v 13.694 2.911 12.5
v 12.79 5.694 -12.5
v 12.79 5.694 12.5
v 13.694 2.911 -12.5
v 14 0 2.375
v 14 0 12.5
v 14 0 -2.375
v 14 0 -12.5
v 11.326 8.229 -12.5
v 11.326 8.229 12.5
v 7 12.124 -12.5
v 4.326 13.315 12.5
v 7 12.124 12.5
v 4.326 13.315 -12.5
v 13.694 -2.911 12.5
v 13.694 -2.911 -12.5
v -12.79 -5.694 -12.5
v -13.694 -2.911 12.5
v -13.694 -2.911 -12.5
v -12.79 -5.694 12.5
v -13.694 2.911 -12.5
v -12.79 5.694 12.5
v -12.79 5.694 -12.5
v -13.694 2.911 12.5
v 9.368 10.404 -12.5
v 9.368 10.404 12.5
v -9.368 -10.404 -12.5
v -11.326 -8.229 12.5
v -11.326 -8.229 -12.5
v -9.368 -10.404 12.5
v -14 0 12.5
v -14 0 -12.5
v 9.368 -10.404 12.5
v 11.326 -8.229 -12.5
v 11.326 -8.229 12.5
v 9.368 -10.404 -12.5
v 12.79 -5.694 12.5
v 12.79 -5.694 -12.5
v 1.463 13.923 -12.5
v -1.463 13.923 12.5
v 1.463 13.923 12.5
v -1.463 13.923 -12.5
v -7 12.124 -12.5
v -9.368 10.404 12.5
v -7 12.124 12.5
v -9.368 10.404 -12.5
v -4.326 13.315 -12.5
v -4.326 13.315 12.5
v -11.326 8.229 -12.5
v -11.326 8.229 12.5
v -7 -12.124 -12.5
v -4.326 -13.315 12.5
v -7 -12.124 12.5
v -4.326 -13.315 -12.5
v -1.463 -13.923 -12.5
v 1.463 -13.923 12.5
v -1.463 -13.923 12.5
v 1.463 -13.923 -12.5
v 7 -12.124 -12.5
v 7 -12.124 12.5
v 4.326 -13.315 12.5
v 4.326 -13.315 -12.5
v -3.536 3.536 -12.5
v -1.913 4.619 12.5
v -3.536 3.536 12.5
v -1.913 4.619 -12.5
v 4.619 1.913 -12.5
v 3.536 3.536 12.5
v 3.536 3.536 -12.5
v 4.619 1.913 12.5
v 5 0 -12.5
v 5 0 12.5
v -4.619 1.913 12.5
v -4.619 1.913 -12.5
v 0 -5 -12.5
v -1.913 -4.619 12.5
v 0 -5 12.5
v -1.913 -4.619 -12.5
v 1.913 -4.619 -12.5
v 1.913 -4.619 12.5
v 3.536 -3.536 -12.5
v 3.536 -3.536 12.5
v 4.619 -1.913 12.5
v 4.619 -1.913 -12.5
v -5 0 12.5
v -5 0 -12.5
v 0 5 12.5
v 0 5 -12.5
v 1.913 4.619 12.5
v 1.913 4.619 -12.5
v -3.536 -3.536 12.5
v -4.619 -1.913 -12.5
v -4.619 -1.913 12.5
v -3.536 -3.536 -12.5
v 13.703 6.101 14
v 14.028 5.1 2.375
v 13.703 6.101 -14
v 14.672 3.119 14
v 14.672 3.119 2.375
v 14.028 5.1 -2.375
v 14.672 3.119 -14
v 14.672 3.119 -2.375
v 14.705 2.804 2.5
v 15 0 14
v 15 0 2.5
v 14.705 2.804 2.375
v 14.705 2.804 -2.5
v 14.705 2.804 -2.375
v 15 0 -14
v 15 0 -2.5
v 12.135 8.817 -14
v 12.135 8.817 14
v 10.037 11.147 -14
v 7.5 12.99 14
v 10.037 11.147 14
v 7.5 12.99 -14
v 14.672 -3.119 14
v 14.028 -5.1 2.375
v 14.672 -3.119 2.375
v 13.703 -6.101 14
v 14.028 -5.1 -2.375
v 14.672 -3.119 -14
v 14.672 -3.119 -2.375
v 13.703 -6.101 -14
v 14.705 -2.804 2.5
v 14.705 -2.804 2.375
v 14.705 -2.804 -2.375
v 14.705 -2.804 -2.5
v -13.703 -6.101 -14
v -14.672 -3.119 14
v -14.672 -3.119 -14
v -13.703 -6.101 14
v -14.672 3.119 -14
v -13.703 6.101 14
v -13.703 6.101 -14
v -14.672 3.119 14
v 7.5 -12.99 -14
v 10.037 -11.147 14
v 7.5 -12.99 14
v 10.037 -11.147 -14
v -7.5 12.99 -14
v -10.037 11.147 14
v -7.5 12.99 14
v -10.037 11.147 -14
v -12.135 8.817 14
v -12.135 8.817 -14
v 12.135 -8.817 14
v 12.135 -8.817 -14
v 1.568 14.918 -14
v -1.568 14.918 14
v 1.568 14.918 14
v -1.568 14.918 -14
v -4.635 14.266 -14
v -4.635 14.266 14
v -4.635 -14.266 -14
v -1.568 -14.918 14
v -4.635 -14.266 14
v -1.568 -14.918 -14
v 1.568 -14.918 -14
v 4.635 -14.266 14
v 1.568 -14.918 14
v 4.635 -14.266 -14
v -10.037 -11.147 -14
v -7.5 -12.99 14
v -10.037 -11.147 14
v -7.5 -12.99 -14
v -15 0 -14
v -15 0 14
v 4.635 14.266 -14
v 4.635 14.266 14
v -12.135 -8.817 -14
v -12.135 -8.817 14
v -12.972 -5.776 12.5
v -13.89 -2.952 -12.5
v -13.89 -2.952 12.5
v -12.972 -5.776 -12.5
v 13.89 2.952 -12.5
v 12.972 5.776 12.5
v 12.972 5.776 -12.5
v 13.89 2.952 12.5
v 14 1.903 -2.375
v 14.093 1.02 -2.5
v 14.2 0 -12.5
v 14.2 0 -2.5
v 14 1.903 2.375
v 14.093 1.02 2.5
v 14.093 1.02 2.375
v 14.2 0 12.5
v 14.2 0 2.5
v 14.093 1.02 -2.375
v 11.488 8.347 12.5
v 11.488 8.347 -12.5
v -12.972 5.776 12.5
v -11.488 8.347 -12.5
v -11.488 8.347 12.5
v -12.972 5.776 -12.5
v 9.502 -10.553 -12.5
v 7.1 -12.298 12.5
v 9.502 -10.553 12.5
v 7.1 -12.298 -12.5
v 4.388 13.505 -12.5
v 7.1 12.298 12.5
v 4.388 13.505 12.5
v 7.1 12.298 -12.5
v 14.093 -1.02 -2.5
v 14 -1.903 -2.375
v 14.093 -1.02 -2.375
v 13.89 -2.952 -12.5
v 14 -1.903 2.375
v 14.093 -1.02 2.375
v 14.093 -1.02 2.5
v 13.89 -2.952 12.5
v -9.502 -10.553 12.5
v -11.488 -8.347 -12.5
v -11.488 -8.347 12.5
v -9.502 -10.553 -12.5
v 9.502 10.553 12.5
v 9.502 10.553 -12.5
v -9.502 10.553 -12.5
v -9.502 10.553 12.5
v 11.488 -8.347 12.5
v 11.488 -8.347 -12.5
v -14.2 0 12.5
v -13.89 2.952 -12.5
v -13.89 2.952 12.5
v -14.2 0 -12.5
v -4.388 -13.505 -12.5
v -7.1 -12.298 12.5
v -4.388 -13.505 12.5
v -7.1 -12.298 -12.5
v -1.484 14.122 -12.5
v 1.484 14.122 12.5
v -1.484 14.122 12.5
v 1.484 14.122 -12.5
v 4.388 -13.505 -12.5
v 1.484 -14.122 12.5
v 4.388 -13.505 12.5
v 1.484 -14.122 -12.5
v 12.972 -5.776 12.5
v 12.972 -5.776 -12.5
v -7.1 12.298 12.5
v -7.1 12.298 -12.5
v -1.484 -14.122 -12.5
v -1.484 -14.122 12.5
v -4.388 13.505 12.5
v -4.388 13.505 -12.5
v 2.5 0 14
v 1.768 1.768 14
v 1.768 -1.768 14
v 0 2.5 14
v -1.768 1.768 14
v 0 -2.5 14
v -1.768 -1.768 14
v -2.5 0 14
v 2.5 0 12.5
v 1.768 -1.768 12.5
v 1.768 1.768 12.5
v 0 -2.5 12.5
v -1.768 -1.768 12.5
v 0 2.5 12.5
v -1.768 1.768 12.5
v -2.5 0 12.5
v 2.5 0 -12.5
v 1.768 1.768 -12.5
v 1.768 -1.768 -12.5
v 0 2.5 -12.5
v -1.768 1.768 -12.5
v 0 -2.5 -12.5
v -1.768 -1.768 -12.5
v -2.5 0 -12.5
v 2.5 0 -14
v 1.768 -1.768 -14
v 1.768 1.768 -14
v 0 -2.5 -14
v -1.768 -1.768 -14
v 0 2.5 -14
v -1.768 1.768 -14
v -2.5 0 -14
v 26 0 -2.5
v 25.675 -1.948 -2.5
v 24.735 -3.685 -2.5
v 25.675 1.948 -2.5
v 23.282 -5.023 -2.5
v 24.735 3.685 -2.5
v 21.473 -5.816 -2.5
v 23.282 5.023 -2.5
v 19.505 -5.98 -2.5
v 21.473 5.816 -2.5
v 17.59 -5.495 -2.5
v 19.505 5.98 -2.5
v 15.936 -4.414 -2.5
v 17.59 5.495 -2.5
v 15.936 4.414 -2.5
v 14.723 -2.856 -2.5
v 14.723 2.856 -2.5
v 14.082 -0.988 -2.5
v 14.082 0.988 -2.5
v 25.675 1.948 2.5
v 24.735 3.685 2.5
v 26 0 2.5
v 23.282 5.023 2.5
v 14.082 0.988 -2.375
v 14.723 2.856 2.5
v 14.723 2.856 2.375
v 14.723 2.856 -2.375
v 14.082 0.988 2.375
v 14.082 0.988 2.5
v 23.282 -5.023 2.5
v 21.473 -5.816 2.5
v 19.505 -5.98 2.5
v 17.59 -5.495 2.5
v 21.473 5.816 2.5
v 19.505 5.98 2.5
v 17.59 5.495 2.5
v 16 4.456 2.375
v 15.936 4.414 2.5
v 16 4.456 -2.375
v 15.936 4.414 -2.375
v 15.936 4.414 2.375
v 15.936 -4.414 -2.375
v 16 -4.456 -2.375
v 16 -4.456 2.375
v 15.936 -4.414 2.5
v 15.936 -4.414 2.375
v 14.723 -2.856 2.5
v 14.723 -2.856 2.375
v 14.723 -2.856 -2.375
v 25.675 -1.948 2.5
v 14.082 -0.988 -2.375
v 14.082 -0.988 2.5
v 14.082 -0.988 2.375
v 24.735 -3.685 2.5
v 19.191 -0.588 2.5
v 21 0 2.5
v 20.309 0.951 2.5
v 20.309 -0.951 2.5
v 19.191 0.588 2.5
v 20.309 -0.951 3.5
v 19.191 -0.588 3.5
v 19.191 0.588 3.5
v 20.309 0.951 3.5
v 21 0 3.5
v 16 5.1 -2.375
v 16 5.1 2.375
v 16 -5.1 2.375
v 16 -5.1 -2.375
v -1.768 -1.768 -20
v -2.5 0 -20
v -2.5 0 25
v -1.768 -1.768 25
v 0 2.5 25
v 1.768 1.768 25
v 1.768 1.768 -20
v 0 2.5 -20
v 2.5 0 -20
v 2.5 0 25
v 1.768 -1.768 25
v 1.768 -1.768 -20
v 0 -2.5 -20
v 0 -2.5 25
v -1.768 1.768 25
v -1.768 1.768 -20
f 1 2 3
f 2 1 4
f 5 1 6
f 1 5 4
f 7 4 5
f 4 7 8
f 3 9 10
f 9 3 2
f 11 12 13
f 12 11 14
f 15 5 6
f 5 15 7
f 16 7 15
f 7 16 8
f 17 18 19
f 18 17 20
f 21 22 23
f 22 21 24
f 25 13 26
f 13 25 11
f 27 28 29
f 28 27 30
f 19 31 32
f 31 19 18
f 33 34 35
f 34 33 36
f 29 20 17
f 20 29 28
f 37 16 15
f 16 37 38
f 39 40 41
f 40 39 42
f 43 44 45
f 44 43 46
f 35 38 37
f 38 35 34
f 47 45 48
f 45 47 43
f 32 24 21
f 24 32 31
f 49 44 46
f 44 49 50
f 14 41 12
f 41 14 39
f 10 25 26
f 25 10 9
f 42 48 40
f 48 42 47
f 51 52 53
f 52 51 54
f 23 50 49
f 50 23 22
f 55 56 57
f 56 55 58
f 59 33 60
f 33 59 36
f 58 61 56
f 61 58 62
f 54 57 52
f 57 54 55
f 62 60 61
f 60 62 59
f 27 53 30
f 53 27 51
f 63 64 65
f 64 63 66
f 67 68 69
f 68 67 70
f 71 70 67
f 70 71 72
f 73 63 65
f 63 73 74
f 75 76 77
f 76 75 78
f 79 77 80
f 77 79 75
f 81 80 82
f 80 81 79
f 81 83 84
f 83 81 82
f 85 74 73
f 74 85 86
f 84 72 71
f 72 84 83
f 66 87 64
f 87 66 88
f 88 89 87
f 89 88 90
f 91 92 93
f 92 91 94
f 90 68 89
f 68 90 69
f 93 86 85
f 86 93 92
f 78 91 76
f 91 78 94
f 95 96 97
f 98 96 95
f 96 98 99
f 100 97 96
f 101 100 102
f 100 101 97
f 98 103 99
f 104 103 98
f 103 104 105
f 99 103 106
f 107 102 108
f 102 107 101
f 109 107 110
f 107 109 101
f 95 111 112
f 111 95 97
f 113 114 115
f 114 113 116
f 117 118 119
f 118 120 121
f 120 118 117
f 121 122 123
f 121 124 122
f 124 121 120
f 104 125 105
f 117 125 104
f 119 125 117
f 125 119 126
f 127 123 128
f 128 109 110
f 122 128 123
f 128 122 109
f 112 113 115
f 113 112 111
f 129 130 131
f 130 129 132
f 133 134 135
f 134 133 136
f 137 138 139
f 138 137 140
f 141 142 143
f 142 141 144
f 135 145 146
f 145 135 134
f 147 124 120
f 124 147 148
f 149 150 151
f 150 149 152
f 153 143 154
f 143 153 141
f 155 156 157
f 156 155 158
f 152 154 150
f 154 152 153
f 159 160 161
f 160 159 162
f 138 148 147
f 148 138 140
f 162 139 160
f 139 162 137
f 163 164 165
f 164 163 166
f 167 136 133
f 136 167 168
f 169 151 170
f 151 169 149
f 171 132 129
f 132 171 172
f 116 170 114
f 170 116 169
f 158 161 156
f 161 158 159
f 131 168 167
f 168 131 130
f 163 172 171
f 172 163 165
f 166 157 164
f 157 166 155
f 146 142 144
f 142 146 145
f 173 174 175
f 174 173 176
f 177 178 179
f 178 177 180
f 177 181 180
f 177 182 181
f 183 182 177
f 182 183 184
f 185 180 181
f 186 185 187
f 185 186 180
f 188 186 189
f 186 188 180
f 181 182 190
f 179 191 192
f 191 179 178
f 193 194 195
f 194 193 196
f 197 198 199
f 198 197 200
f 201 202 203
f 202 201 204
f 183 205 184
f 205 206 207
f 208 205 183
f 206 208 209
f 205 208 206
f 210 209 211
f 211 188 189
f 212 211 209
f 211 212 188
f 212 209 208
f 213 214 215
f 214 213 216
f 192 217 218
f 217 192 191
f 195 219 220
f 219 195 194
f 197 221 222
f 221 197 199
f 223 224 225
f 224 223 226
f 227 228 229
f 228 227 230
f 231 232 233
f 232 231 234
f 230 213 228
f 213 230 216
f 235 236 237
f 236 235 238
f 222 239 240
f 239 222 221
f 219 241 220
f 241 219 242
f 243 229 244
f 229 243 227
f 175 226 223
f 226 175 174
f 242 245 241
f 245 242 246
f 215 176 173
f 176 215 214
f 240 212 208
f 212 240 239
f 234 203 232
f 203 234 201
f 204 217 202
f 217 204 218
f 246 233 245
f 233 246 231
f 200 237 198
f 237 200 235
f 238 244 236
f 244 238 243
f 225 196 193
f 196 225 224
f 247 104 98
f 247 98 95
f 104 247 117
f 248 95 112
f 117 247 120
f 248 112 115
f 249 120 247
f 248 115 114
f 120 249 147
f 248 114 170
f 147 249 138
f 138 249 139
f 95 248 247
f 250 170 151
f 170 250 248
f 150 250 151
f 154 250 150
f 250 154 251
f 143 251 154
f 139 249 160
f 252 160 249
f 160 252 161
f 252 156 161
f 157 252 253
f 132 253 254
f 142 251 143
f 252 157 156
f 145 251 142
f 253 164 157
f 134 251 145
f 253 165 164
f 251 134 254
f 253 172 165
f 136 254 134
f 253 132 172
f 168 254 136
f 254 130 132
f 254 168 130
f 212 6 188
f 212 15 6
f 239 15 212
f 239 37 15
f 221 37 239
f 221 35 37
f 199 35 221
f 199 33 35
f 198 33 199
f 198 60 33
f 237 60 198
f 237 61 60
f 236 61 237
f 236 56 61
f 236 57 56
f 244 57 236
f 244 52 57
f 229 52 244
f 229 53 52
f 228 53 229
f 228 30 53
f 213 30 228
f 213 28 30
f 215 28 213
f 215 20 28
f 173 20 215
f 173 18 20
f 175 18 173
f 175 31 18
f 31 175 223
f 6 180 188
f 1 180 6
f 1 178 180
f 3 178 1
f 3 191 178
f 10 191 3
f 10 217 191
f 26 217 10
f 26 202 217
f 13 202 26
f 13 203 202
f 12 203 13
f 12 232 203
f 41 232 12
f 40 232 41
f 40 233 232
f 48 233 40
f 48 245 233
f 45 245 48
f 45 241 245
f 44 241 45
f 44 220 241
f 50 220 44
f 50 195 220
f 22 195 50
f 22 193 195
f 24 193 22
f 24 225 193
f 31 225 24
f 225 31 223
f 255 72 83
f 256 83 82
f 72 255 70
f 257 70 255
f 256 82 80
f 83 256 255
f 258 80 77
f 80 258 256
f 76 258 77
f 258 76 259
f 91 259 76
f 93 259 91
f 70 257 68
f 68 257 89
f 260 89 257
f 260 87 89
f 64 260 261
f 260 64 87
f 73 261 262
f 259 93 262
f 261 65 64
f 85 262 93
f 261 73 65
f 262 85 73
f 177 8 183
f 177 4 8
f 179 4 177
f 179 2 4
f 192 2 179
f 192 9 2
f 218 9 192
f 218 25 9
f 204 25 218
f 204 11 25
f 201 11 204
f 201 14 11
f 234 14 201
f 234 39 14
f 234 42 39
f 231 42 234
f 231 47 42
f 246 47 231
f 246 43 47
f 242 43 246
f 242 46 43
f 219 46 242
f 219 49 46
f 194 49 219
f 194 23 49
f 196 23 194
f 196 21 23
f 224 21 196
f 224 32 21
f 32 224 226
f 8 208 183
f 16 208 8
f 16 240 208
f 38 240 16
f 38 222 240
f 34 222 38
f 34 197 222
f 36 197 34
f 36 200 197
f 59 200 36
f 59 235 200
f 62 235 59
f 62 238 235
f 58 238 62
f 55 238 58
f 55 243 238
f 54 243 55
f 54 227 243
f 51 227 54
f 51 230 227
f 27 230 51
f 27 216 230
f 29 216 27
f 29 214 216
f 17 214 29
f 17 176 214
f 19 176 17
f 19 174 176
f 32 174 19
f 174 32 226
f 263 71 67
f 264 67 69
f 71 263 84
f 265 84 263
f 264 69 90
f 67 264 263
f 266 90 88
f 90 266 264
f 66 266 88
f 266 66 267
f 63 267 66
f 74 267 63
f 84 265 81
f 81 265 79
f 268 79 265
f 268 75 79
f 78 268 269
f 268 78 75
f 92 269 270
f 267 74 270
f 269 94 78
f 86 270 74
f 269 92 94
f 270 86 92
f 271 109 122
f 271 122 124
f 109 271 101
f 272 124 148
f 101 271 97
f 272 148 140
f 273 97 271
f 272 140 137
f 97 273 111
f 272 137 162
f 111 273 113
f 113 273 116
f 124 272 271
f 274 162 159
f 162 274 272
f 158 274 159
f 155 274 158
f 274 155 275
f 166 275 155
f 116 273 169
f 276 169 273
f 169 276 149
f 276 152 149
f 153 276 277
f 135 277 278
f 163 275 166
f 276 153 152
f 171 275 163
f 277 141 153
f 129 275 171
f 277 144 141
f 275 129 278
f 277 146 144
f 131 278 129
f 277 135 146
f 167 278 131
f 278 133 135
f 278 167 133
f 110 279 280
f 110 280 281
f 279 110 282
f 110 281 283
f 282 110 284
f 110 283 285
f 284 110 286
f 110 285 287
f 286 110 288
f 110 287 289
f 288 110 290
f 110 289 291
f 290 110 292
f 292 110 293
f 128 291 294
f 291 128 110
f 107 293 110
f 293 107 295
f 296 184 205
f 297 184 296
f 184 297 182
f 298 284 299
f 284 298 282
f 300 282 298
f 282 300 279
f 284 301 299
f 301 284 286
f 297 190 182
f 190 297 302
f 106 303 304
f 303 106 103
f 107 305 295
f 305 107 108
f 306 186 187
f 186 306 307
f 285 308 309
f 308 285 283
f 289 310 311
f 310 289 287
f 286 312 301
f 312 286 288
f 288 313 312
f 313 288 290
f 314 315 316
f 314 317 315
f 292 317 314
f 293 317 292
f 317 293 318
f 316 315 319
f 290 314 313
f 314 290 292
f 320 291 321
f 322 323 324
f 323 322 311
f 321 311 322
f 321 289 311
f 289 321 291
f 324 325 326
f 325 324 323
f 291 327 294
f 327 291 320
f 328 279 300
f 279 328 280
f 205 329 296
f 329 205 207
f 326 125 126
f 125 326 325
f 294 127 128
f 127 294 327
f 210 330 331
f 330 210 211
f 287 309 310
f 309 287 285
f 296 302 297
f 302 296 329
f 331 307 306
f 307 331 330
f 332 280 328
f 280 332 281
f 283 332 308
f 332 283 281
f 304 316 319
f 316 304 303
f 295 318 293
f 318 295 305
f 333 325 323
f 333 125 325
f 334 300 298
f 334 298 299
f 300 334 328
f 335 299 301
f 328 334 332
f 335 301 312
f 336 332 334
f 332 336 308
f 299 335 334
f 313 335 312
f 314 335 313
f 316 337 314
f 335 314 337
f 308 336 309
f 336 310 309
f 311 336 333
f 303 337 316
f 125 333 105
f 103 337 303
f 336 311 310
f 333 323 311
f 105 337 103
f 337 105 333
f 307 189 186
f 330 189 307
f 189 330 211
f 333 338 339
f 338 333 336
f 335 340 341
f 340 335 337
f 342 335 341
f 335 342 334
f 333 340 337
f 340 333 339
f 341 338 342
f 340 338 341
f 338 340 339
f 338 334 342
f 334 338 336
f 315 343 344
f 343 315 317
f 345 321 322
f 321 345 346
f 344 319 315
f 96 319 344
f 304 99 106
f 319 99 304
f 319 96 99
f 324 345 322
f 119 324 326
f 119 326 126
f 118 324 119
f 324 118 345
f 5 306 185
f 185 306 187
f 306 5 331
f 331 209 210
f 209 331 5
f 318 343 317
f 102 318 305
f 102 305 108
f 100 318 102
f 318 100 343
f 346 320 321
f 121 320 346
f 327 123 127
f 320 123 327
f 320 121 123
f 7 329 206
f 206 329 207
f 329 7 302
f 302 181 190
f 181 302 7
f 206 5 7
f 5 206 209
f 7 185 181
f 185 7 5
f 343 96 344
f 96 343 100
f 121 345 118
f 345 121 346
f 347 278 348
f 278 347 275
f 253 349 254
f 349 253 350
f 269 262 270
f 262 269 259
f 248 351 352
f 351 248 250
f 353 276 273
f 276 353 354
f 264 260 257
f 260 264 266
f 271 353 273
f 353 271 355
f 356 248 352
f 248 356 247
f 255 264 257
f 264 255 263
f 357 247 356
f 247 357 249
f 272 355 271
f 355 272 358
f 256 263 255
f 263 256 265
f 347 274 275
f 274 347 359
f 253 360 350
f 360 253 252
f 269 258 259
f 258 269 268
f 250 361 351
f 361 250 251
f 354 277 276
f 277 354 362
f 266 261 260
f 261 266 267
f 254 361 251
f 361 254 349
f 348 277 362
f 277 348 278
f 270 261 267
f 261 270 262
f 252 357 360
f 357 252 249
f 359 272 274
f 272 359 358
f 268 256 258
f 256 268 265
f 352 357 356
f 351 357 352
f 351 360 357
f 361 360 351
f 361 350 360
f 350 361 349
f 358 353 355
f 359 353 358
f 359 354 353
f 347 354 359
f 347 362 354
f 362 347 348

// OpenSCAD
// Parameters
stator_diameter_mm = 28; //[14:56:0.5]
stator_height_mm = 27; //[13.5:54:0.5]
stator_bore_diameter_mm = 10; //[5:20:0.5]
rotor_outer_diameter_mm = 30; //[15:60:0.5]
rotor_height_mm = 27; //[13.5:54:0.5]
shaft_diameter_mm = 5; //[2.5:10:0.25]
shaft_extension_front_mm = 10; //[5:20:0.5]
shaft_extension_rear_mm = 5; //[2.5:10:0.5]
endcap_thickness_mm = 1.5; //[0.75:3:0.25]
clearance_mm = 0.2; //[0.05:0.6:0.05]
overlap_mm = 1; //[0.5:2:0.1]
buzzer_diameter_mm = 12; //[6:24:0.5]
buzzer_height_mm = 5; //[2.5:10:0.5]
buzzer_pin_diameter_mm = 2; //[1:4:0.25]
buzzer_pin_height_mm = 2; //[1:6:0.5]

// Buzzer / side component - FIXED: guaranteed physical attachment to rotor can
module buzzer() {
  rotor_r  = rotor_outer_diameter_mm/2;
  buzzer_r = buzzer_diameter_mm/2;

  // Place buzzer so it intersects the rotor side wall by overlap_mm (1-2mm recommended)
  // This removes any visible gap in top/bottom views and prevents floating geometry.
  buzzer_x = rotor_r + buzzer_r - overlap_mm;

  // Keep buzzer centered vertically on the motor so it doesn't appear offset/floating
  buzzer_z = 0;

  // Add a small "bridge" block that spans from inside the rotor radius to inside the buzzer,
  // guaranteeing a robust union even if render tolerances show a tiny gap.
  bridge_len = overlap_mm * 2;                 // thickness in X
  bridge_w   = buzzer_diameter_mm * 0.85;      // width in Y
  bridge_h   = buzzer_height_mm * 0.95;        // height in Z

  color([0.1, 0.1, 0.6])
  union() {
    // Buzzer body (main side component)
    translate([buzzer_x, 0, buzzer_z])
      cylinder(r=buzzer_r, h=buzzer_height_mm, center=true);

    // Buzzer pin - attached to buzzer body with overlap
    translate([buzzer_x, 0, buzzer_z + buzzer_height_mm/2 + buzzer_pin_height_mm/2 - overlap_mm])
      cylinder(r=buzzer_pin_diameter_mm/2, h=buzzer_pin_height_mm, center=true);

    // Bridge pad: centered at rotor outer radius so it intersects BOTH rotor and buzzer
    // Center X at rotor_r ensures half of the bridge is inside the rotor (by overlap),
    // and the other half reaches toward the buzzer.
    translate([rotor_r, 0, buzzer_z])
      cube([bridge_len, bridge_w, bridge_h], center=true);
  }
}

// Motor assembly (single connected solid via union)
module assembly() {
  union() {

    // Stator
    color("DimGray")
      difference() {
        cylinder(r=stator_diameter_mm/2, h=stator_height_mm, center=true);
        cylinder(r=stator_bore_diameter_mm/2, h=stator_height_mm + 2*overlap_mm, center=true);
      }

    // Rotor can
    color("Black")
      difference() {
        cylinder(r=rotor_outer_diameter_mm/2, h=rotor_height_mm, center=true);
        cylinder(r=stator_diameter_mm/2 + clearance_mm, h=rotor_height_mm + 2*overlap_mm, center=true);
      }

    // Endcaps (slightly overlapping rotor for guaranteed union)
    color("Silver")
    union() {
      translate([0, 0, rotor_height_mm/2 + endcap_thickness_mm/2 - overlap_mm])
        cylinder(r=rotor_outer_diameter_mm/2, h=endcap_thickness_mm, center=true);

      translate([0, 0, -rotor_height_mm/2 - endcap_thickness_mm/2 + overlap_mm])
        cylinder(r=rotor_outer_diameter_mm/2, h=endcap_thickness_mm, center=true);
    }

    // Central shaft (passes through, already connected)
    color("Silver")
      translate([0, 0, (shaft_extension_front_mm - shaft_extension_rear_mm)/2])
        cylinder(
          r=shaft_diameter_mm/2,
          h=stator_height_mm + shaft_extension_front_mm + shaft_extension_rear_mm + 2*endcap_thickness_mm,
          center=true
        );

    // Side component (buzzer/connector) - now guaranteed attached (overlap + bridge)
    buzzer();
  }
}

assembly();
